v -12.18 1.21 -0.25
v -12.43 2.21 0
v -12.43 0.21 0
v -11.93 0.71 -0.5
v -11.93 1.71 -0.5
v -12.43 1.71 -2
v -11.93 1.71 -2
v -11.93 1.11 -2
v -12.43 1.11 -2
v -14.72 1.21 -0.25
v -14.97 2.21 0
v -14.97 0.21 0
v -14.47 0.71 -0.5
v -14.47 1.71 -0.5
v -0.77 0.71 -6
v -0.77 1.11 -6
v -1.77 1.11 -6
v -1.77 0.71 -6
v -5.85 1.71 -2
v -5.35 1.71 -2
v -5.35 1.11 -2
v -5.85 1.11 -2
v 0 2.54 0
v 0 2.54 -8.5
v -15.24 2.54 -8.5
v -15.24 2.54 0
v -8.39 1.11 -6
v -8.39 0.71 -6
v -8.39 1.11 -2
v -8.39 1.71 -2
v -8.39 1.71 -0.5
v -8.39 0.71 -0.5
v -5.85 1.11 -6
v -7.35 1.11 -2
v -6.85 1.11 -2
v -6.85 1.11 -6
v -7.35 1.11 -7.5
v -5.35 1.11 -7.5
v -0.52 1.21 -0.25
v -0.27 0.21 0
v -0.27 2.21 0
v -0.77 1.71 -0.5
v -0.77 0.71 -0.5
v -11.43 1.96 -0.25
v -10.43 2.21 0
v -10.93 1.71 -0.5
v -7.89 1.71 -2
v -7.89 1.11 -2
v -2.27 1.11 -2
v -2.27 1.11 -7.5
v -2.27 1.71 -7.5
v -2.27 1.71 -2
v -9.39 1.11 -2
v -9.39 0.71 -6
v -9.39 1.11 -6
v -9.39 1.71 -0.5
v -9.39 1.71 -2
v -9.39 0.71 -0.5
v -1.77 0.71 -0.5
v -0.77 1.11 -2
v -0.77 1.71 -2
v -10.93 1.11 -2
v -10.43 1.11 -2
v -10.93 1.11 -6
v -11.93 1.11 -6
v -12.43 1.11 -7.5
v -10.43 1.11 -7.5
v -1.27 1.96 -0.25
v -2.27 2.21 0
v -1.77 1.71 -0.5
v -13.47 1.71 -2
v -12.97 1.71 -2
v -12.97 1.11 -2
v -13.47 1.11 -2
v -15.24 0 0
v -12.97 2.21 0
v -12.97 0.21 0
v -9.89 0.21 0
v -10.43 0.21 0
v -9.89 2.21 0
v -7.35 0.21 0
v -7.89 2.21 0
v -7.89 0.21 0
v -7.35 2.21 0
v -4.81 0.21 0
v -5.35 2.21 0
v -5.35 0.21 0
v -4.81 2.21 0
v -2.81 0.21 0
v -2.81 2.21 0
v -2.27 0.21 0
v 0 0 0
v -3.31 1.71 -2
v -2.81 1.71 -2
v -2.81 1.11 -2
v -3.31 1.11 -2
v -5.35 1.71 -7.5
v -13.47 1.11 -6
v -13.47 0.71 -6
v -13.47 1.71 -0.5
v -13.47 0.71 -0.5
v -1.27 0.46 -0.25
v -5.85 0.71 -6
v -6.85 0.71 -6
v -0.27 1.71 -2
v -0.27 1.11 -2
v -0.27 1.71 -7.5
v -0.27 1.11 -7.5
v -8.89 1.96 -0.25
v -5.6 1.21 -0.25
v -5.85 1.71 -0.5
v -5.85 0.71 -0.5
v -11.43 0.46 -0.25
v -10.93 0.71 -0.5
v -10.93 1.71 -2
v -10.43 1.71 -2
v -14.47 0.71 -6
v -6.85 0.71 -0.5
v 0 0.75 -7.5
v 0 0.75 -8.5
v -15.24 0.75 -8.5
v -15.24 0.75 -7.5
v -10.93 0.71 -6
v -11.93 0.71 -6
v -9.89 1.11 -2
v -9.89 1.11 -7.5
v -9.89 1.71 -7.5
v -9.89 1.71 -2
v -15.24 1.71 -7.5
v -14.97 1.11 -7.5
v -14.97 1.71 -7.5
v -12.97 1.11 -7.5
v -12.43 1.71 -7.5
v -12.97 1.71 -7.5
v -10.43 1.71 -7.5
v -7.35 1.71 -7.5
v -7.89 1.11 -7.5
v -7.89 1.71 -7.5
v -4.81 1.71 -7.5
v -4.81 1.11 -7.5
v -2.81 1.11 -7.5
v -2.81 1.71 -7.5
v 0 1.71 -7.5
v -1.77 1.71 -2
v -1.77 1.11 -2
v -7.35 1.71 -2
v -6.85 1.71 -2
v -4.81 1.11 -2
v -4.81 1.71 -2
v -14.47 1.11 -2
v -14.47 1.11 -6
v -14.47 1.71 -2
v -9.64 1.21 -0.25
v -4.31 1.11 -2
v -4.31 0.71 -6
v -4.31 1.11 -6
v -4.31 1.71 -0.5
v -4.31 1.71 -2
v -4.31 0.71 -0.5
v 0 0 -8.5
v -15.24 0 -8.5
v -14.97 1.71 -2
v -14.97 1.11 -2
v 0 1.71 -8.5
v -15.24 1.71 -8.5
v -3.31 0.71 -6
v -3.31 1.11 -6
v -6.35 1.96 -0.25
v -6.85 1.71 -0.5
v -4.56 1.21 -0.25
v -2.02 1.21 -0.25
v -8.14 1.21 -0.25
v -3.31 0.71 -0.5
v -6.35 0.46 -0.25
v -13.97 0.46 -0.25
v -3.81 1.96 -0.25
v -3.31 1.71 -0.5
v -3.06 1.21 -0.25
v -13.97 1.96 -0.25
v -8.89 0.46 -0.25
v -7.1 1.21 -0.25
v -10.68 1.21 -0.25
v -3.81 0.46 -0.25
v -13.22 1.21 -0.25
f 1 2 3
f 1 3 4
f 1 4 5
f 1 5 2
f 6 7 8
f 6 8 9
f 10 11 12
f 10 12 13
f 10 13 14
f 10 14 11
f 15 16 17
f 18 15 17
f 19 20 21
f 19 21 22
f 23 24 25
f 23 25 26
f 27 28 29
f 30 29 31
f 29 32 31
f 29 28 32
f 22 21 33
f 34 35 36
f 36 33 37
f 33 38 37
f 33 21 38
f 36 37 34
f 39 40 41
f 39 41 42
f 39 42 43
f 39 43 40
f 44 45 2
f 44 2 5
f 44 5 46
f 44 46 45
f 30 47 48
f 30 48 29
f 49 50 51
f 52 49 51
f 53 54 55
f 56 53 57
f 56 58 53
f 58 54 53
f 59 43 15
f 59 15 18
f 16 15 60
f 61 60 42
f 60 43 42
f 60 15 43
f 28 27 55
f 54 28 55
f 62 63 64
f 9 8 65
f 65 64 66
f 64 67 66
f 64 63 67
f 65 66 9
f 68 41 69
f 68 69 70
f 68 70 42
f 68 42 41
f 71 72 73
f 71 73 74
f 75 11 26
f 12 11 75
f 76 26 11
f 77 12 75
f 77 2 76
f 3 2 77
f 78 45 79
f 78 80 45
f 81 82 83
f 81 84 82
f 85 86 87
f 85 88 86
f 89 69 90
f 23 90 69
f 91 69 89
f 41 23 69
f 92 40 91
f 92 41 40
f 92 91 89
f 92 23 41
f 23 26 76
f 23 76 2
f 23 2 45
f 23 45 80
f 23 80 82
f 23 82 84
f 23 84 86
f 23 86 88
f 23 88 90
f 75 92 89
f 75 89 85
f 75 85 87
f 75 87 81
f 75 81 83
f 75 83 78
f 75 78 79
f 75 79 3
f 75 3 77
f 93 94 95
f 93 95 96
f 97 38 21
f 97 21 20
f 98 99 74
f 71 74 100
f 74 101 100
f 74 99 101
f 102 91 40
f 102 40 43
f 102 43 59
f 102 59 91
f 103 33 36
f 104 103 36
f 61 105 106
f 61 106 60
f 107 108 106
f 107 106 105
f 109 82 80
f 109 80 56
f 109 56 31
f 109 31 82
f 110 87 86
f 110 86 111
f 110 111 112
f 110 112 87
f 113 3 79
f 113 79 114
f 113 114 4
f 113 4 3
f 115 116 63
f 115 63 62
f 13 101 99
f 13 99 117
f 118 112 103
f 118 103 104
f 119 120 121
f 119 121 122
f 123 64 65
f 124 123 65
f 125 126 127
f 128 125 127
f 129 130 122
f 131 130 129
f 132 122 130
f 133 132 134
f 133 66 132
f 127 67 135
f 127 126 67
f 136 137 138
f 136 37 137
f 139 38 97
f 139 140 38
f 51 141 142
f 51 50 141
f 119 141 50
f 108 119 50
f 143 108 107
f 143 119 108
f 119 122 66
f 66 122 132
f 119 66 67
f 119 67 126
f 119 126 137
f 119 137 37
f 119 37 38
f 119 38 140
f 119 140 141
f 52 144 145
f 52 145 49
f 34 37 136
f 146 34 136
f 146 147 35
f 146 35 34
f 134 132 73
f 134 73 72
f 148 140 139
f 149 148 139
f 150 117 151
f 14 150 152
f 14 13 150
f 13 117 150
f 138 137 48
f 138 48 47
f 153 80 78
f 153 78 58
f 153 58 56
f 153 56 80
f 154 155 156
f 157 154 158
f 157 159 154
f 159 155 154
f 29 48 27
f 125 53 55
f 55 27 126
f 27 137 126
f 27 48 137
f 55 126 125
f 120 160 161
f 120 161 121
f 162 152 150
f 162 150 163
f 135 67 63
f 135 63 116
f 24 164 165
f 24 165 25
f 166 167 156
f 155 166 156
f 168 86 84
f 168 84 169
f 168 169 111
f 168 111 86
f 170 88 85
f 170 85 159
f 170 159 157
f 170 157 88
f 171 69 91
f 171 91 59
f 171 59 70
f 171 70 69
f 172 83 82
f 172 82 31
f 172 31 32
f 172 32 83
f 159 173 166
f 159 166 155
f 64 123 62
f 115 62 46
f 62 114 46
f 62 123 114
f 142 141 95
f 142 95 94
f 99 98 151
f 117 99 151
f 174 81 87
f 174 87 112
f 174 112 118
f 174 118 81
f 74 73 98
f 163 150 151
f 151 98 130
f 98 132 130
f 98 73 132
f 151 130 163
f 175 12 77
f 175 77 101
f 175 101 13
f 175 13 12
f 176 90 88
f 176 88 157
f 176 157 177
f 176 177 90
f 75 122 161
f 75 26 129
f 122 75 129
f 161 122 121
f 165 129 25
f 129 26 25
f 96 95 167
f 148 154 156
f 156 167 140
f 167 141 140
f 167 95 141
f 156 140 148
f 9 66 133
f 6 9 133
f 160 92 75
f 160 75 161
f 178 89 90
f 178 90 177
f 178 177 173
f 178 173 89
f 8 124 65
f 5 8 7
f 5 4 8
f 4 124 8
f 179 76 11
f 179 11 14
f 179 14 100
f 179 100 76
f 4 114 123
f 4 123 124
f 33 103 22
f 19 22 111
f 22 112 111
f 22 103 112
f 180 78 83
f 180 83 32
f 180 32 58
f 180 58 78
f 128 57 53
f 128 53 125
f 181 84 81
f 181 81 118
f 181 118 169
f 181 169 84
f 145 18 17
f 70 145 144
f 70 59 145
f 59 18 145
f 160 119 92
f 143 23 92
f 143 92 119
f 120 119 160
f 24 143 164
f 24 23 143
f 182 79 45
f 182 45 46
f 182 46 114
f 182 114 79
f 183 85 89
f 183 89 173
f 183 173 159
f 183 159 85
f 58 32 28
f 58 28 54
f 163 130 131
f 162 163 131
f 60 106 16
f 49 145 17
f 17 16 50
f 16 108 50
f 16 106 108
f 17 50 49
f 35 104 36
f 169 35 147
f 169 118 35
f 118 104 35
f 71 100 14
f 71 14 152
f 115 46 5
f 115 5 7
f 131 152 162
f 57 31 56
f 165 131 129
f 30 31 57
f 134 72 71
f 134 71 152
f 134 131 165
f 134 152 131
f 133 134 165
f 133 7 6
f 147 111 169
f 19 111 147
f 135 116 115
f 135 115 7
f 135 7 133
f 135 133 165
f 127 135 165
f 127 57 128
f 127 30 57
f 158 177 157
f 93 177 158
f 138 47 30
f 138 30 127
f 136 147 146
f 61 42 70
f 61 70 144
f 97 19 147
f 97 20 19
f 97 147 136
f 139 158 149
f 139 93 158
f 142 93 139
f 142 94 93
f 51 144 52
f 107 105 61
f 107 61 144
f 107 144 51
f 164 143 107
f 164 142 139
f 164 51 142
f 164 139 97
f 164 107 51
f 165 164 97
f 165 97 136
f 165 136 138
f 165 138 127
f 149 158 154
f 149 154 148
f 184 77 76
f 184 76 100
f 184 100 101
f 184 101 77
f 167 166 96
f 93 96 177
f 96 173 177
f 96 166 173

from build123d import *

# Parameters (mm, degrees)
BOSS_EXTRUDE1_DEPTH = 15.24
SKETCH2_W           = 2
SKETCH2_H           = 0.6
CUT_EXTRUDE1_DEPTH  = 5.5
SKETCH3_W           = 1
SKETCH3_H           = 1
CUT_EXTRUDE2_DEPTH  = 6
SKETCH4_W           = 2
SKETCH4_H           = 2
CUT_EXTRUDE3_DEPTH  = 0.5
CUT_EXTRUDE3_TAPER  = 45
LPATTERN1_COUNT     = 8
LPATTERN1_PITCH     = 2.54


with BuildPart() as part:
    # Sketch1 → Boss-Extrude1 (new body)
    with BuildSketch(Plane(origin=(0, 0, 0), x_dir=(0, 0, -1), z_dir=(1, 0, 0))):
        Polygon((8.5, 2.54), (0, 2.54), (0, 0), (8.5, 0), (8.5, 0.75), (7.5, 0.75), (7.5, 1.709993), (8.5, 1.709993), align=None)
    extrude(amount=-BOSS_EXTRUDE1_DEPTH)

    # Sketch2 → Cut-Extrude1 (cut)
    with BuildSketch(Plane(origin=(0, 0, -7.5), x_dir=(-1, 0, 0), z_dir=(0, 0, -1))):
        with Locations((1.27, 1.409993)):
            Rectangle(SKETCH2_W, SKETCH2_H)
    cut_extrude1 = extrude(amount=-CUT_EXTRUDE1_DEPTH, mode=Mode.SUBTRACT)

    # Sketch3 → Cut-Extrude2 (cut)
    with BuildSketch(Plane(origin=(0, 0, 0), x_dir=(-1, 0, 0), z_dir=(0, 0, -1))):
        with Locations((1.27, 1.209993)):
            Rectangle(SKETCH3_W, SKETCH3_H)
    cut_extrude2 = extrude(amount=CUT_EXTRUDE2_DEPTH, mode=Mode.SUBTRACT)

    # Sketch4 → Cut-Extrude3 (cut)
    with BuildSketch(Plane.XY):
        with Locations((-1.27, 1.209993)):
            Rectangle(SKETCH4_W, SKETCH4_H)
    cut_extrude3 = extrude(amount=-CUT_EXTRUDE3_DEPTH, taper=CUT_EXTRUDE3_TAPER, mode=Mode.SUBTRACT)

    # LPattern1: Cut-Extrude1, Cut-Extrude2, Cut-Extrude3 ×8
    with Locations(*[(-i * LPATTERN1_PITCH, 0, 0) for i in range(1, LPATTERN1_COUNT)]):
        add(cut_extrude1, mode=Mode.SUBTRACT)
        add(cut_extrude2, mode=Mode.SUBTRACT)
        add(cut_extrude3, mode=Mode.SUBTRACT)


solid = part.part
